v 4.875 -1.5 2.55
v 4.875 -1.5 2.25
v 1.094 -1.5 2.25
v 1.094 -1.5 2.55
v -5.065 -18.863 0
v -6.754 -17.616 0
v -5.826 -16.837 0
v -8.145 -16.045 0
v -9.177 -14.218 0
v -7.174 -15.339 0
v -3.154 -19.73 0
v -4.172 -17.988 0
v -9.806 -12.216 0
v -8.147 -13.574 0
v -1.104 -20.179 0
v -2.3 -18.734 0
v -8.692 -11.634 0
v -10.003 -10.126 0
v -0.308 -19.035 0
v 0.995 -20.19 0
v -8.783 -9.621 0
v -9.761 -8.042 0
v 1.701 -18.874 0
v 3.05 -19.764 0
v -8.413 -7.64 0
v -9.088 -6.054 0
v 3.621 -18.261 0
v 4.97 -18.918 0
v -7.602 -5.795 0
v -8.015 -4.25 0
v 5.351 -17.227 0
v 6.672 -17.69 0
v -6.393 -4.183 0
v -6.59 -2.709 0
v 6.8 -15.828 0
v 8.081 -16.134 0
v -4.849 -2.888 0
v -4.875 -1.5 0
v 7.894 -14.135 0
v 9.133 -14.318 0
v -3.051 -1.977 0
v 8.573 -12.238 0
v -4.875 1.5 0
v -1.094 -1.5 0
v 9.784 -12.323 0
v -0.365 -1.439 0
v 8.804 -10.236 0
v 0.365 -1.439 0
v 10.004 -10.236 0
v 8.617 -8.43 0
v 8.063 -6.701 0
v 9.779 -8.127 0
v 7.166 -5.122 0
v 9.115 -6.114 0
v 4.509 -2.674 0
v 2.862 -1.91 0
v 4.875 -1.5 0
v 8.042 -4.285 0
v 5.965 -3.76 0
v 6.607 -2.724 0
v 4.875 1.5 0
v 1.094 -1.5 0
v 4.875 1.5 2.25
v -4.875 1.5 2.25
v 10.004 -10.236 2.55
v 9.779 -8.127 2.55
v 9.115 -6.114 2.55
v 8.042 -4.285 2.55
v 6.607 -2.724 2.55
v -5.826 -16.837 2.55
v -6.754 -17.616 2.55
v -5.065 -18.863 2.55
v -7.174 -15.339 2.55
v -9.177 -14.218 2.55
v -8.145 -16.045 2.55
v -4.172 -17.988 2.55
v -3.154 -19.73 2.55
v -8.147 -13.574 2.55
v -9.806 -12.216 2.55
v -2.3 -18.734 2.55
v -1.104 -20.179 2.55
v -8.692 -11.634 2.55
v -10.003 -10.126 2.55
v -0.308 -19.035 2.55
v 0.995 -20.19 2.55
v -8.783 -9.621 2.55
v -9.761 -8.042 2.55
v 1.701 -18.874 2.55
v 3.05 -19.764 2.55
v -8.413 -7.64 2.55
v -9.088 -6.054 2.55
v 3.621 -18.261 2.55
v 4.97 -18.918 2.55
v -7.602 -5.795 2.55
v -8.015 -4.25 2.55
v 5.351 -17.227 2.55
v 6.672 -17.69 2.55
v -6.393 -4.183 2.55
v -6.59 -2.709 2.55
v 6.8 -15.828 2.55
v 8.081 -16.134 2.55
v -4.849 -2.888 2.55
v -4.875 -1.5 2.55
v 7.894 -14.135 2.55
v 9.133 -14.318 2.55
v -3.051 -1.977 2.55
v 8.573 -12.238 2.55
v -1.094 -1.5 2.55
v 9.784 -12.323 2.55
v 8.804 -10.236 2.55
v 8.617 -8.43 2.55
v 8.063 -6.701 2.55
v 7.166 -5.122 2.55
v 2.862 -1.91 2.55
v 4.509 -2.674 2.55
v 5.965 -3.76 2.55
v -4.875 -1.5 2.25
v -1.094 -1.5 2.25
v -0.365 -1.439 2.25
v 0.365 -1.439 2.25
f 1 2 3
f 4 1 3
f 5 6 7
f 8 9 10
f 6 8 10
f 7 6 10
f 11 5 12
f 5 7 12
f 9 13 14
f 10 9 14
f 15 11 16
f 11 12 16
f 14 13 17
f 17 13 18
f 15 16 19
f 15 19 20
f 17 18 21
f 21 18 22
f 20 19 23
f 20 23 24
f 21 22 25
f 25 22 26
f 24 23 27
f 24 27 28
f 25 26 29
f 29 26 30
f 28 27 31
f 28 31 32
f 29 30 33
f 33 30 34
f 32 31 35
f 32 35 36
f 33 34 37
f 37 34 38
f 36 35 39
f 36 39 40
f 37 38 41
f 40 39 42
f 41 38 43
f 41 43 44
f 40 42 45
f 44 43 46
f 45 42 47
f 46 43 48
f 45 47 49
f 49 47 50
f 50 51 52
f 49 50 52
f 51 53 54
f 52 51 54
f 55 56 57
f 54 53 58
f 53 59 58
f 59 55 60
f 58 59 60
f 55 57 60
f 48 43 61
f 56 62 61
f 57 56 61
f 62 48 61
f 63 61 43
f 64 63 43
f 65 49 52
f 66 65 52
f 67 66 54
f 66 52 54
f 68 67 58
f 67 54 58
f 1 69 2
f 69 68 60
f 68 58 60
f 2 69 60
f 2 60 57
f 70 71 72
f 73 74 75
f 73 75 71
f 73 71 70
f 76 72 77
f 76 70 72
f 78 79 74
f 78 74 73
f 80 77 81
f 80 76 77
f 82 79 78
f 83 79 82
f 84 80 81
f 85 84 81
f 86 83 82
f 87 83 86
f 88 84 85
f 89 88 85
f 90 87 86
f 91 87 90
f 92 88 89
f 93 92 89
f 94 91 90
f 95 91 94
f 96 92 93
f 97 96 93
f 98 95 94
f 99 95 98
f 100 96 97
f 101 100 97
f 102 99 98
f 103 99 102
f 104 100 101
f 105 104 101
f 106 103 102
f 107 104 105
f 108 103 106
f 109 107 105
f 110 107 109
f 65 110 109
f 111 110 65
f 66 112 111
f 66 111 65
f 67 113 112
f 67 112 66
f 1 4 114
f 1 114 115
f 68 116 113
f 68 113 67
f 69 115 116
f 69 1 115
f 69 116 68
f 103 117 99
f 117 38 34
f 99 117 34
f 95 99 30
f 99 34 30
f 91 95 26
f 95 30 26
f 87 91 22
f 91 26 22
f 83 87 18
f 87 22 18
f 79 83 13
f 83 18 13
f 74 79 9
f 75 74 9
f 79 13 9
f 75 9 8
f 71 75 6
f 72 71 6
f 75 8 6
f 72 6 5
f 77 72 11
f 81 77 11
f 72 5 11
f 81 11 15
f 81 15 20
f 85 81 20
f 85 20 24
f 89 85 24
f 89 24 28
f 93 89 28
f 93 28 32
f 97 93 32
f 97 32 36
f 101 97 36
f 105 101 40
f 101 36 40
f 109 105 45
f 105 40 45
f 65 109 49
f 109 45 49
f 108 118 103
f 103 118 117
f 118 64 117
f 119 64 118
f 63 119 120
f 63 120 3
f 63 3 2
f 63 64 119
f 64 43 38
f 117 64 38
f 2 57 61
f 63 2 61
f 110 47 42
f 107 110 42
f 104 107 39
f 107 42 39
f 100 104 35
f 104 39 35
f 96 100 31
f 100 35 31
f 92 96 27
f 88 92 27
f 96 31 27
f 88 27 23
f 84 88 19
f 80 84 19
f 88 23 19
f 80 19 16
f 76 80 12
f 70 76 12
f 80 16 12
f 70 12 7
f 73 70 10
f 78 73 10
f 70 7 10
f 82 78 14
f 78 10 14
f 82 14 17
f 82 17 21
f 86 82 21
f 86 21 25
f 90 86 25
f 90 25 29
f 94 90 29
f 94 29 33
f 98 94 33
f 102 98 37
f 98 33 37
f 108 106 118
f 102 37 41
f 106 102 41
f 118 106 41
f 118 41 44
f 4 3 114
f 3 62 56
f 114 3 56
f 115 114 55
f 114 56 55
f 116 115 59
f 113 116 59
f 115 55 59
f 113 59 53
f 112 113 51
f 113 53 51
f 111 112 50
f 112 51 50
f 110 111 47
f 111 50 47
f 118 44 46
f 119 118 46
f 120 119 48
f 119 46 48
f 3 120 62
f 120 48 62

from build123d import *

# Parameters (mm, degrees)
F1_DEPTH = 2.25
F2_DEPTH = 2.55


with BuildPart() as f1:
    # F0 (on Top) → F1 (new body)
    with BuildSketch(Plane.XY):
        with BuildLine():
            ThreePointArc((-4.875, -1.5), (0, -0.2318236393), (4.875, -1.5))
            Line((4.875, -1.5), (4.875, 1.5))
            Line((4.875, 1.5), (-4.875, 1.5))
            Line((-4.875, 1.5), (-4.875, -1.5))
        make_face()
        with BuildLine():
            Line((1.0935325176, -1.5), (4.875, -1.5))
            ThreePointArc((4.875, -1.5), (0, -0.2318236393), (-4.875, -1.5))
            Line((-4.875, -1.5), (-1.0935325176, -1.5))
            ThreePointArc((-1.0935325176, -1.5), (0, -1.4318236393), (1.0935325176, -1.5))
        make_face()
    extrude(amount=F1_DEPTH)

    # F0 (on Top) → F2 (join)
    with BuildSketch(Plane.XY):
        with BuildLine():
            ThreePointArc((10.0040881804, -10.2359118196), (8.6270420829, -5.1707439823), (4.875, -1.5))
            Line((4.875, -1.5), (1.0935325176, -1.5))
            ThreePointArc((1.0935325176, -1.5), (6.6007395571, -4.4099178283), (8.8040881804, -10.2359118196))
            ThreePointArc((8.8040881804, -10.2359118196), (-5.8259939913, -16.8366513767), (-1.0935325176, -1.5))
            Line((-1.0935325176, -1.5), (-4.875, -1.5))
            ThreePointArc((-4.875, -1.5), (-5.0651678374, -18.8629539025), (10.0040881804, -10.2359118196))
        make_face()
    extrude(amount=F2_DEPTH)


solid = f1.part
